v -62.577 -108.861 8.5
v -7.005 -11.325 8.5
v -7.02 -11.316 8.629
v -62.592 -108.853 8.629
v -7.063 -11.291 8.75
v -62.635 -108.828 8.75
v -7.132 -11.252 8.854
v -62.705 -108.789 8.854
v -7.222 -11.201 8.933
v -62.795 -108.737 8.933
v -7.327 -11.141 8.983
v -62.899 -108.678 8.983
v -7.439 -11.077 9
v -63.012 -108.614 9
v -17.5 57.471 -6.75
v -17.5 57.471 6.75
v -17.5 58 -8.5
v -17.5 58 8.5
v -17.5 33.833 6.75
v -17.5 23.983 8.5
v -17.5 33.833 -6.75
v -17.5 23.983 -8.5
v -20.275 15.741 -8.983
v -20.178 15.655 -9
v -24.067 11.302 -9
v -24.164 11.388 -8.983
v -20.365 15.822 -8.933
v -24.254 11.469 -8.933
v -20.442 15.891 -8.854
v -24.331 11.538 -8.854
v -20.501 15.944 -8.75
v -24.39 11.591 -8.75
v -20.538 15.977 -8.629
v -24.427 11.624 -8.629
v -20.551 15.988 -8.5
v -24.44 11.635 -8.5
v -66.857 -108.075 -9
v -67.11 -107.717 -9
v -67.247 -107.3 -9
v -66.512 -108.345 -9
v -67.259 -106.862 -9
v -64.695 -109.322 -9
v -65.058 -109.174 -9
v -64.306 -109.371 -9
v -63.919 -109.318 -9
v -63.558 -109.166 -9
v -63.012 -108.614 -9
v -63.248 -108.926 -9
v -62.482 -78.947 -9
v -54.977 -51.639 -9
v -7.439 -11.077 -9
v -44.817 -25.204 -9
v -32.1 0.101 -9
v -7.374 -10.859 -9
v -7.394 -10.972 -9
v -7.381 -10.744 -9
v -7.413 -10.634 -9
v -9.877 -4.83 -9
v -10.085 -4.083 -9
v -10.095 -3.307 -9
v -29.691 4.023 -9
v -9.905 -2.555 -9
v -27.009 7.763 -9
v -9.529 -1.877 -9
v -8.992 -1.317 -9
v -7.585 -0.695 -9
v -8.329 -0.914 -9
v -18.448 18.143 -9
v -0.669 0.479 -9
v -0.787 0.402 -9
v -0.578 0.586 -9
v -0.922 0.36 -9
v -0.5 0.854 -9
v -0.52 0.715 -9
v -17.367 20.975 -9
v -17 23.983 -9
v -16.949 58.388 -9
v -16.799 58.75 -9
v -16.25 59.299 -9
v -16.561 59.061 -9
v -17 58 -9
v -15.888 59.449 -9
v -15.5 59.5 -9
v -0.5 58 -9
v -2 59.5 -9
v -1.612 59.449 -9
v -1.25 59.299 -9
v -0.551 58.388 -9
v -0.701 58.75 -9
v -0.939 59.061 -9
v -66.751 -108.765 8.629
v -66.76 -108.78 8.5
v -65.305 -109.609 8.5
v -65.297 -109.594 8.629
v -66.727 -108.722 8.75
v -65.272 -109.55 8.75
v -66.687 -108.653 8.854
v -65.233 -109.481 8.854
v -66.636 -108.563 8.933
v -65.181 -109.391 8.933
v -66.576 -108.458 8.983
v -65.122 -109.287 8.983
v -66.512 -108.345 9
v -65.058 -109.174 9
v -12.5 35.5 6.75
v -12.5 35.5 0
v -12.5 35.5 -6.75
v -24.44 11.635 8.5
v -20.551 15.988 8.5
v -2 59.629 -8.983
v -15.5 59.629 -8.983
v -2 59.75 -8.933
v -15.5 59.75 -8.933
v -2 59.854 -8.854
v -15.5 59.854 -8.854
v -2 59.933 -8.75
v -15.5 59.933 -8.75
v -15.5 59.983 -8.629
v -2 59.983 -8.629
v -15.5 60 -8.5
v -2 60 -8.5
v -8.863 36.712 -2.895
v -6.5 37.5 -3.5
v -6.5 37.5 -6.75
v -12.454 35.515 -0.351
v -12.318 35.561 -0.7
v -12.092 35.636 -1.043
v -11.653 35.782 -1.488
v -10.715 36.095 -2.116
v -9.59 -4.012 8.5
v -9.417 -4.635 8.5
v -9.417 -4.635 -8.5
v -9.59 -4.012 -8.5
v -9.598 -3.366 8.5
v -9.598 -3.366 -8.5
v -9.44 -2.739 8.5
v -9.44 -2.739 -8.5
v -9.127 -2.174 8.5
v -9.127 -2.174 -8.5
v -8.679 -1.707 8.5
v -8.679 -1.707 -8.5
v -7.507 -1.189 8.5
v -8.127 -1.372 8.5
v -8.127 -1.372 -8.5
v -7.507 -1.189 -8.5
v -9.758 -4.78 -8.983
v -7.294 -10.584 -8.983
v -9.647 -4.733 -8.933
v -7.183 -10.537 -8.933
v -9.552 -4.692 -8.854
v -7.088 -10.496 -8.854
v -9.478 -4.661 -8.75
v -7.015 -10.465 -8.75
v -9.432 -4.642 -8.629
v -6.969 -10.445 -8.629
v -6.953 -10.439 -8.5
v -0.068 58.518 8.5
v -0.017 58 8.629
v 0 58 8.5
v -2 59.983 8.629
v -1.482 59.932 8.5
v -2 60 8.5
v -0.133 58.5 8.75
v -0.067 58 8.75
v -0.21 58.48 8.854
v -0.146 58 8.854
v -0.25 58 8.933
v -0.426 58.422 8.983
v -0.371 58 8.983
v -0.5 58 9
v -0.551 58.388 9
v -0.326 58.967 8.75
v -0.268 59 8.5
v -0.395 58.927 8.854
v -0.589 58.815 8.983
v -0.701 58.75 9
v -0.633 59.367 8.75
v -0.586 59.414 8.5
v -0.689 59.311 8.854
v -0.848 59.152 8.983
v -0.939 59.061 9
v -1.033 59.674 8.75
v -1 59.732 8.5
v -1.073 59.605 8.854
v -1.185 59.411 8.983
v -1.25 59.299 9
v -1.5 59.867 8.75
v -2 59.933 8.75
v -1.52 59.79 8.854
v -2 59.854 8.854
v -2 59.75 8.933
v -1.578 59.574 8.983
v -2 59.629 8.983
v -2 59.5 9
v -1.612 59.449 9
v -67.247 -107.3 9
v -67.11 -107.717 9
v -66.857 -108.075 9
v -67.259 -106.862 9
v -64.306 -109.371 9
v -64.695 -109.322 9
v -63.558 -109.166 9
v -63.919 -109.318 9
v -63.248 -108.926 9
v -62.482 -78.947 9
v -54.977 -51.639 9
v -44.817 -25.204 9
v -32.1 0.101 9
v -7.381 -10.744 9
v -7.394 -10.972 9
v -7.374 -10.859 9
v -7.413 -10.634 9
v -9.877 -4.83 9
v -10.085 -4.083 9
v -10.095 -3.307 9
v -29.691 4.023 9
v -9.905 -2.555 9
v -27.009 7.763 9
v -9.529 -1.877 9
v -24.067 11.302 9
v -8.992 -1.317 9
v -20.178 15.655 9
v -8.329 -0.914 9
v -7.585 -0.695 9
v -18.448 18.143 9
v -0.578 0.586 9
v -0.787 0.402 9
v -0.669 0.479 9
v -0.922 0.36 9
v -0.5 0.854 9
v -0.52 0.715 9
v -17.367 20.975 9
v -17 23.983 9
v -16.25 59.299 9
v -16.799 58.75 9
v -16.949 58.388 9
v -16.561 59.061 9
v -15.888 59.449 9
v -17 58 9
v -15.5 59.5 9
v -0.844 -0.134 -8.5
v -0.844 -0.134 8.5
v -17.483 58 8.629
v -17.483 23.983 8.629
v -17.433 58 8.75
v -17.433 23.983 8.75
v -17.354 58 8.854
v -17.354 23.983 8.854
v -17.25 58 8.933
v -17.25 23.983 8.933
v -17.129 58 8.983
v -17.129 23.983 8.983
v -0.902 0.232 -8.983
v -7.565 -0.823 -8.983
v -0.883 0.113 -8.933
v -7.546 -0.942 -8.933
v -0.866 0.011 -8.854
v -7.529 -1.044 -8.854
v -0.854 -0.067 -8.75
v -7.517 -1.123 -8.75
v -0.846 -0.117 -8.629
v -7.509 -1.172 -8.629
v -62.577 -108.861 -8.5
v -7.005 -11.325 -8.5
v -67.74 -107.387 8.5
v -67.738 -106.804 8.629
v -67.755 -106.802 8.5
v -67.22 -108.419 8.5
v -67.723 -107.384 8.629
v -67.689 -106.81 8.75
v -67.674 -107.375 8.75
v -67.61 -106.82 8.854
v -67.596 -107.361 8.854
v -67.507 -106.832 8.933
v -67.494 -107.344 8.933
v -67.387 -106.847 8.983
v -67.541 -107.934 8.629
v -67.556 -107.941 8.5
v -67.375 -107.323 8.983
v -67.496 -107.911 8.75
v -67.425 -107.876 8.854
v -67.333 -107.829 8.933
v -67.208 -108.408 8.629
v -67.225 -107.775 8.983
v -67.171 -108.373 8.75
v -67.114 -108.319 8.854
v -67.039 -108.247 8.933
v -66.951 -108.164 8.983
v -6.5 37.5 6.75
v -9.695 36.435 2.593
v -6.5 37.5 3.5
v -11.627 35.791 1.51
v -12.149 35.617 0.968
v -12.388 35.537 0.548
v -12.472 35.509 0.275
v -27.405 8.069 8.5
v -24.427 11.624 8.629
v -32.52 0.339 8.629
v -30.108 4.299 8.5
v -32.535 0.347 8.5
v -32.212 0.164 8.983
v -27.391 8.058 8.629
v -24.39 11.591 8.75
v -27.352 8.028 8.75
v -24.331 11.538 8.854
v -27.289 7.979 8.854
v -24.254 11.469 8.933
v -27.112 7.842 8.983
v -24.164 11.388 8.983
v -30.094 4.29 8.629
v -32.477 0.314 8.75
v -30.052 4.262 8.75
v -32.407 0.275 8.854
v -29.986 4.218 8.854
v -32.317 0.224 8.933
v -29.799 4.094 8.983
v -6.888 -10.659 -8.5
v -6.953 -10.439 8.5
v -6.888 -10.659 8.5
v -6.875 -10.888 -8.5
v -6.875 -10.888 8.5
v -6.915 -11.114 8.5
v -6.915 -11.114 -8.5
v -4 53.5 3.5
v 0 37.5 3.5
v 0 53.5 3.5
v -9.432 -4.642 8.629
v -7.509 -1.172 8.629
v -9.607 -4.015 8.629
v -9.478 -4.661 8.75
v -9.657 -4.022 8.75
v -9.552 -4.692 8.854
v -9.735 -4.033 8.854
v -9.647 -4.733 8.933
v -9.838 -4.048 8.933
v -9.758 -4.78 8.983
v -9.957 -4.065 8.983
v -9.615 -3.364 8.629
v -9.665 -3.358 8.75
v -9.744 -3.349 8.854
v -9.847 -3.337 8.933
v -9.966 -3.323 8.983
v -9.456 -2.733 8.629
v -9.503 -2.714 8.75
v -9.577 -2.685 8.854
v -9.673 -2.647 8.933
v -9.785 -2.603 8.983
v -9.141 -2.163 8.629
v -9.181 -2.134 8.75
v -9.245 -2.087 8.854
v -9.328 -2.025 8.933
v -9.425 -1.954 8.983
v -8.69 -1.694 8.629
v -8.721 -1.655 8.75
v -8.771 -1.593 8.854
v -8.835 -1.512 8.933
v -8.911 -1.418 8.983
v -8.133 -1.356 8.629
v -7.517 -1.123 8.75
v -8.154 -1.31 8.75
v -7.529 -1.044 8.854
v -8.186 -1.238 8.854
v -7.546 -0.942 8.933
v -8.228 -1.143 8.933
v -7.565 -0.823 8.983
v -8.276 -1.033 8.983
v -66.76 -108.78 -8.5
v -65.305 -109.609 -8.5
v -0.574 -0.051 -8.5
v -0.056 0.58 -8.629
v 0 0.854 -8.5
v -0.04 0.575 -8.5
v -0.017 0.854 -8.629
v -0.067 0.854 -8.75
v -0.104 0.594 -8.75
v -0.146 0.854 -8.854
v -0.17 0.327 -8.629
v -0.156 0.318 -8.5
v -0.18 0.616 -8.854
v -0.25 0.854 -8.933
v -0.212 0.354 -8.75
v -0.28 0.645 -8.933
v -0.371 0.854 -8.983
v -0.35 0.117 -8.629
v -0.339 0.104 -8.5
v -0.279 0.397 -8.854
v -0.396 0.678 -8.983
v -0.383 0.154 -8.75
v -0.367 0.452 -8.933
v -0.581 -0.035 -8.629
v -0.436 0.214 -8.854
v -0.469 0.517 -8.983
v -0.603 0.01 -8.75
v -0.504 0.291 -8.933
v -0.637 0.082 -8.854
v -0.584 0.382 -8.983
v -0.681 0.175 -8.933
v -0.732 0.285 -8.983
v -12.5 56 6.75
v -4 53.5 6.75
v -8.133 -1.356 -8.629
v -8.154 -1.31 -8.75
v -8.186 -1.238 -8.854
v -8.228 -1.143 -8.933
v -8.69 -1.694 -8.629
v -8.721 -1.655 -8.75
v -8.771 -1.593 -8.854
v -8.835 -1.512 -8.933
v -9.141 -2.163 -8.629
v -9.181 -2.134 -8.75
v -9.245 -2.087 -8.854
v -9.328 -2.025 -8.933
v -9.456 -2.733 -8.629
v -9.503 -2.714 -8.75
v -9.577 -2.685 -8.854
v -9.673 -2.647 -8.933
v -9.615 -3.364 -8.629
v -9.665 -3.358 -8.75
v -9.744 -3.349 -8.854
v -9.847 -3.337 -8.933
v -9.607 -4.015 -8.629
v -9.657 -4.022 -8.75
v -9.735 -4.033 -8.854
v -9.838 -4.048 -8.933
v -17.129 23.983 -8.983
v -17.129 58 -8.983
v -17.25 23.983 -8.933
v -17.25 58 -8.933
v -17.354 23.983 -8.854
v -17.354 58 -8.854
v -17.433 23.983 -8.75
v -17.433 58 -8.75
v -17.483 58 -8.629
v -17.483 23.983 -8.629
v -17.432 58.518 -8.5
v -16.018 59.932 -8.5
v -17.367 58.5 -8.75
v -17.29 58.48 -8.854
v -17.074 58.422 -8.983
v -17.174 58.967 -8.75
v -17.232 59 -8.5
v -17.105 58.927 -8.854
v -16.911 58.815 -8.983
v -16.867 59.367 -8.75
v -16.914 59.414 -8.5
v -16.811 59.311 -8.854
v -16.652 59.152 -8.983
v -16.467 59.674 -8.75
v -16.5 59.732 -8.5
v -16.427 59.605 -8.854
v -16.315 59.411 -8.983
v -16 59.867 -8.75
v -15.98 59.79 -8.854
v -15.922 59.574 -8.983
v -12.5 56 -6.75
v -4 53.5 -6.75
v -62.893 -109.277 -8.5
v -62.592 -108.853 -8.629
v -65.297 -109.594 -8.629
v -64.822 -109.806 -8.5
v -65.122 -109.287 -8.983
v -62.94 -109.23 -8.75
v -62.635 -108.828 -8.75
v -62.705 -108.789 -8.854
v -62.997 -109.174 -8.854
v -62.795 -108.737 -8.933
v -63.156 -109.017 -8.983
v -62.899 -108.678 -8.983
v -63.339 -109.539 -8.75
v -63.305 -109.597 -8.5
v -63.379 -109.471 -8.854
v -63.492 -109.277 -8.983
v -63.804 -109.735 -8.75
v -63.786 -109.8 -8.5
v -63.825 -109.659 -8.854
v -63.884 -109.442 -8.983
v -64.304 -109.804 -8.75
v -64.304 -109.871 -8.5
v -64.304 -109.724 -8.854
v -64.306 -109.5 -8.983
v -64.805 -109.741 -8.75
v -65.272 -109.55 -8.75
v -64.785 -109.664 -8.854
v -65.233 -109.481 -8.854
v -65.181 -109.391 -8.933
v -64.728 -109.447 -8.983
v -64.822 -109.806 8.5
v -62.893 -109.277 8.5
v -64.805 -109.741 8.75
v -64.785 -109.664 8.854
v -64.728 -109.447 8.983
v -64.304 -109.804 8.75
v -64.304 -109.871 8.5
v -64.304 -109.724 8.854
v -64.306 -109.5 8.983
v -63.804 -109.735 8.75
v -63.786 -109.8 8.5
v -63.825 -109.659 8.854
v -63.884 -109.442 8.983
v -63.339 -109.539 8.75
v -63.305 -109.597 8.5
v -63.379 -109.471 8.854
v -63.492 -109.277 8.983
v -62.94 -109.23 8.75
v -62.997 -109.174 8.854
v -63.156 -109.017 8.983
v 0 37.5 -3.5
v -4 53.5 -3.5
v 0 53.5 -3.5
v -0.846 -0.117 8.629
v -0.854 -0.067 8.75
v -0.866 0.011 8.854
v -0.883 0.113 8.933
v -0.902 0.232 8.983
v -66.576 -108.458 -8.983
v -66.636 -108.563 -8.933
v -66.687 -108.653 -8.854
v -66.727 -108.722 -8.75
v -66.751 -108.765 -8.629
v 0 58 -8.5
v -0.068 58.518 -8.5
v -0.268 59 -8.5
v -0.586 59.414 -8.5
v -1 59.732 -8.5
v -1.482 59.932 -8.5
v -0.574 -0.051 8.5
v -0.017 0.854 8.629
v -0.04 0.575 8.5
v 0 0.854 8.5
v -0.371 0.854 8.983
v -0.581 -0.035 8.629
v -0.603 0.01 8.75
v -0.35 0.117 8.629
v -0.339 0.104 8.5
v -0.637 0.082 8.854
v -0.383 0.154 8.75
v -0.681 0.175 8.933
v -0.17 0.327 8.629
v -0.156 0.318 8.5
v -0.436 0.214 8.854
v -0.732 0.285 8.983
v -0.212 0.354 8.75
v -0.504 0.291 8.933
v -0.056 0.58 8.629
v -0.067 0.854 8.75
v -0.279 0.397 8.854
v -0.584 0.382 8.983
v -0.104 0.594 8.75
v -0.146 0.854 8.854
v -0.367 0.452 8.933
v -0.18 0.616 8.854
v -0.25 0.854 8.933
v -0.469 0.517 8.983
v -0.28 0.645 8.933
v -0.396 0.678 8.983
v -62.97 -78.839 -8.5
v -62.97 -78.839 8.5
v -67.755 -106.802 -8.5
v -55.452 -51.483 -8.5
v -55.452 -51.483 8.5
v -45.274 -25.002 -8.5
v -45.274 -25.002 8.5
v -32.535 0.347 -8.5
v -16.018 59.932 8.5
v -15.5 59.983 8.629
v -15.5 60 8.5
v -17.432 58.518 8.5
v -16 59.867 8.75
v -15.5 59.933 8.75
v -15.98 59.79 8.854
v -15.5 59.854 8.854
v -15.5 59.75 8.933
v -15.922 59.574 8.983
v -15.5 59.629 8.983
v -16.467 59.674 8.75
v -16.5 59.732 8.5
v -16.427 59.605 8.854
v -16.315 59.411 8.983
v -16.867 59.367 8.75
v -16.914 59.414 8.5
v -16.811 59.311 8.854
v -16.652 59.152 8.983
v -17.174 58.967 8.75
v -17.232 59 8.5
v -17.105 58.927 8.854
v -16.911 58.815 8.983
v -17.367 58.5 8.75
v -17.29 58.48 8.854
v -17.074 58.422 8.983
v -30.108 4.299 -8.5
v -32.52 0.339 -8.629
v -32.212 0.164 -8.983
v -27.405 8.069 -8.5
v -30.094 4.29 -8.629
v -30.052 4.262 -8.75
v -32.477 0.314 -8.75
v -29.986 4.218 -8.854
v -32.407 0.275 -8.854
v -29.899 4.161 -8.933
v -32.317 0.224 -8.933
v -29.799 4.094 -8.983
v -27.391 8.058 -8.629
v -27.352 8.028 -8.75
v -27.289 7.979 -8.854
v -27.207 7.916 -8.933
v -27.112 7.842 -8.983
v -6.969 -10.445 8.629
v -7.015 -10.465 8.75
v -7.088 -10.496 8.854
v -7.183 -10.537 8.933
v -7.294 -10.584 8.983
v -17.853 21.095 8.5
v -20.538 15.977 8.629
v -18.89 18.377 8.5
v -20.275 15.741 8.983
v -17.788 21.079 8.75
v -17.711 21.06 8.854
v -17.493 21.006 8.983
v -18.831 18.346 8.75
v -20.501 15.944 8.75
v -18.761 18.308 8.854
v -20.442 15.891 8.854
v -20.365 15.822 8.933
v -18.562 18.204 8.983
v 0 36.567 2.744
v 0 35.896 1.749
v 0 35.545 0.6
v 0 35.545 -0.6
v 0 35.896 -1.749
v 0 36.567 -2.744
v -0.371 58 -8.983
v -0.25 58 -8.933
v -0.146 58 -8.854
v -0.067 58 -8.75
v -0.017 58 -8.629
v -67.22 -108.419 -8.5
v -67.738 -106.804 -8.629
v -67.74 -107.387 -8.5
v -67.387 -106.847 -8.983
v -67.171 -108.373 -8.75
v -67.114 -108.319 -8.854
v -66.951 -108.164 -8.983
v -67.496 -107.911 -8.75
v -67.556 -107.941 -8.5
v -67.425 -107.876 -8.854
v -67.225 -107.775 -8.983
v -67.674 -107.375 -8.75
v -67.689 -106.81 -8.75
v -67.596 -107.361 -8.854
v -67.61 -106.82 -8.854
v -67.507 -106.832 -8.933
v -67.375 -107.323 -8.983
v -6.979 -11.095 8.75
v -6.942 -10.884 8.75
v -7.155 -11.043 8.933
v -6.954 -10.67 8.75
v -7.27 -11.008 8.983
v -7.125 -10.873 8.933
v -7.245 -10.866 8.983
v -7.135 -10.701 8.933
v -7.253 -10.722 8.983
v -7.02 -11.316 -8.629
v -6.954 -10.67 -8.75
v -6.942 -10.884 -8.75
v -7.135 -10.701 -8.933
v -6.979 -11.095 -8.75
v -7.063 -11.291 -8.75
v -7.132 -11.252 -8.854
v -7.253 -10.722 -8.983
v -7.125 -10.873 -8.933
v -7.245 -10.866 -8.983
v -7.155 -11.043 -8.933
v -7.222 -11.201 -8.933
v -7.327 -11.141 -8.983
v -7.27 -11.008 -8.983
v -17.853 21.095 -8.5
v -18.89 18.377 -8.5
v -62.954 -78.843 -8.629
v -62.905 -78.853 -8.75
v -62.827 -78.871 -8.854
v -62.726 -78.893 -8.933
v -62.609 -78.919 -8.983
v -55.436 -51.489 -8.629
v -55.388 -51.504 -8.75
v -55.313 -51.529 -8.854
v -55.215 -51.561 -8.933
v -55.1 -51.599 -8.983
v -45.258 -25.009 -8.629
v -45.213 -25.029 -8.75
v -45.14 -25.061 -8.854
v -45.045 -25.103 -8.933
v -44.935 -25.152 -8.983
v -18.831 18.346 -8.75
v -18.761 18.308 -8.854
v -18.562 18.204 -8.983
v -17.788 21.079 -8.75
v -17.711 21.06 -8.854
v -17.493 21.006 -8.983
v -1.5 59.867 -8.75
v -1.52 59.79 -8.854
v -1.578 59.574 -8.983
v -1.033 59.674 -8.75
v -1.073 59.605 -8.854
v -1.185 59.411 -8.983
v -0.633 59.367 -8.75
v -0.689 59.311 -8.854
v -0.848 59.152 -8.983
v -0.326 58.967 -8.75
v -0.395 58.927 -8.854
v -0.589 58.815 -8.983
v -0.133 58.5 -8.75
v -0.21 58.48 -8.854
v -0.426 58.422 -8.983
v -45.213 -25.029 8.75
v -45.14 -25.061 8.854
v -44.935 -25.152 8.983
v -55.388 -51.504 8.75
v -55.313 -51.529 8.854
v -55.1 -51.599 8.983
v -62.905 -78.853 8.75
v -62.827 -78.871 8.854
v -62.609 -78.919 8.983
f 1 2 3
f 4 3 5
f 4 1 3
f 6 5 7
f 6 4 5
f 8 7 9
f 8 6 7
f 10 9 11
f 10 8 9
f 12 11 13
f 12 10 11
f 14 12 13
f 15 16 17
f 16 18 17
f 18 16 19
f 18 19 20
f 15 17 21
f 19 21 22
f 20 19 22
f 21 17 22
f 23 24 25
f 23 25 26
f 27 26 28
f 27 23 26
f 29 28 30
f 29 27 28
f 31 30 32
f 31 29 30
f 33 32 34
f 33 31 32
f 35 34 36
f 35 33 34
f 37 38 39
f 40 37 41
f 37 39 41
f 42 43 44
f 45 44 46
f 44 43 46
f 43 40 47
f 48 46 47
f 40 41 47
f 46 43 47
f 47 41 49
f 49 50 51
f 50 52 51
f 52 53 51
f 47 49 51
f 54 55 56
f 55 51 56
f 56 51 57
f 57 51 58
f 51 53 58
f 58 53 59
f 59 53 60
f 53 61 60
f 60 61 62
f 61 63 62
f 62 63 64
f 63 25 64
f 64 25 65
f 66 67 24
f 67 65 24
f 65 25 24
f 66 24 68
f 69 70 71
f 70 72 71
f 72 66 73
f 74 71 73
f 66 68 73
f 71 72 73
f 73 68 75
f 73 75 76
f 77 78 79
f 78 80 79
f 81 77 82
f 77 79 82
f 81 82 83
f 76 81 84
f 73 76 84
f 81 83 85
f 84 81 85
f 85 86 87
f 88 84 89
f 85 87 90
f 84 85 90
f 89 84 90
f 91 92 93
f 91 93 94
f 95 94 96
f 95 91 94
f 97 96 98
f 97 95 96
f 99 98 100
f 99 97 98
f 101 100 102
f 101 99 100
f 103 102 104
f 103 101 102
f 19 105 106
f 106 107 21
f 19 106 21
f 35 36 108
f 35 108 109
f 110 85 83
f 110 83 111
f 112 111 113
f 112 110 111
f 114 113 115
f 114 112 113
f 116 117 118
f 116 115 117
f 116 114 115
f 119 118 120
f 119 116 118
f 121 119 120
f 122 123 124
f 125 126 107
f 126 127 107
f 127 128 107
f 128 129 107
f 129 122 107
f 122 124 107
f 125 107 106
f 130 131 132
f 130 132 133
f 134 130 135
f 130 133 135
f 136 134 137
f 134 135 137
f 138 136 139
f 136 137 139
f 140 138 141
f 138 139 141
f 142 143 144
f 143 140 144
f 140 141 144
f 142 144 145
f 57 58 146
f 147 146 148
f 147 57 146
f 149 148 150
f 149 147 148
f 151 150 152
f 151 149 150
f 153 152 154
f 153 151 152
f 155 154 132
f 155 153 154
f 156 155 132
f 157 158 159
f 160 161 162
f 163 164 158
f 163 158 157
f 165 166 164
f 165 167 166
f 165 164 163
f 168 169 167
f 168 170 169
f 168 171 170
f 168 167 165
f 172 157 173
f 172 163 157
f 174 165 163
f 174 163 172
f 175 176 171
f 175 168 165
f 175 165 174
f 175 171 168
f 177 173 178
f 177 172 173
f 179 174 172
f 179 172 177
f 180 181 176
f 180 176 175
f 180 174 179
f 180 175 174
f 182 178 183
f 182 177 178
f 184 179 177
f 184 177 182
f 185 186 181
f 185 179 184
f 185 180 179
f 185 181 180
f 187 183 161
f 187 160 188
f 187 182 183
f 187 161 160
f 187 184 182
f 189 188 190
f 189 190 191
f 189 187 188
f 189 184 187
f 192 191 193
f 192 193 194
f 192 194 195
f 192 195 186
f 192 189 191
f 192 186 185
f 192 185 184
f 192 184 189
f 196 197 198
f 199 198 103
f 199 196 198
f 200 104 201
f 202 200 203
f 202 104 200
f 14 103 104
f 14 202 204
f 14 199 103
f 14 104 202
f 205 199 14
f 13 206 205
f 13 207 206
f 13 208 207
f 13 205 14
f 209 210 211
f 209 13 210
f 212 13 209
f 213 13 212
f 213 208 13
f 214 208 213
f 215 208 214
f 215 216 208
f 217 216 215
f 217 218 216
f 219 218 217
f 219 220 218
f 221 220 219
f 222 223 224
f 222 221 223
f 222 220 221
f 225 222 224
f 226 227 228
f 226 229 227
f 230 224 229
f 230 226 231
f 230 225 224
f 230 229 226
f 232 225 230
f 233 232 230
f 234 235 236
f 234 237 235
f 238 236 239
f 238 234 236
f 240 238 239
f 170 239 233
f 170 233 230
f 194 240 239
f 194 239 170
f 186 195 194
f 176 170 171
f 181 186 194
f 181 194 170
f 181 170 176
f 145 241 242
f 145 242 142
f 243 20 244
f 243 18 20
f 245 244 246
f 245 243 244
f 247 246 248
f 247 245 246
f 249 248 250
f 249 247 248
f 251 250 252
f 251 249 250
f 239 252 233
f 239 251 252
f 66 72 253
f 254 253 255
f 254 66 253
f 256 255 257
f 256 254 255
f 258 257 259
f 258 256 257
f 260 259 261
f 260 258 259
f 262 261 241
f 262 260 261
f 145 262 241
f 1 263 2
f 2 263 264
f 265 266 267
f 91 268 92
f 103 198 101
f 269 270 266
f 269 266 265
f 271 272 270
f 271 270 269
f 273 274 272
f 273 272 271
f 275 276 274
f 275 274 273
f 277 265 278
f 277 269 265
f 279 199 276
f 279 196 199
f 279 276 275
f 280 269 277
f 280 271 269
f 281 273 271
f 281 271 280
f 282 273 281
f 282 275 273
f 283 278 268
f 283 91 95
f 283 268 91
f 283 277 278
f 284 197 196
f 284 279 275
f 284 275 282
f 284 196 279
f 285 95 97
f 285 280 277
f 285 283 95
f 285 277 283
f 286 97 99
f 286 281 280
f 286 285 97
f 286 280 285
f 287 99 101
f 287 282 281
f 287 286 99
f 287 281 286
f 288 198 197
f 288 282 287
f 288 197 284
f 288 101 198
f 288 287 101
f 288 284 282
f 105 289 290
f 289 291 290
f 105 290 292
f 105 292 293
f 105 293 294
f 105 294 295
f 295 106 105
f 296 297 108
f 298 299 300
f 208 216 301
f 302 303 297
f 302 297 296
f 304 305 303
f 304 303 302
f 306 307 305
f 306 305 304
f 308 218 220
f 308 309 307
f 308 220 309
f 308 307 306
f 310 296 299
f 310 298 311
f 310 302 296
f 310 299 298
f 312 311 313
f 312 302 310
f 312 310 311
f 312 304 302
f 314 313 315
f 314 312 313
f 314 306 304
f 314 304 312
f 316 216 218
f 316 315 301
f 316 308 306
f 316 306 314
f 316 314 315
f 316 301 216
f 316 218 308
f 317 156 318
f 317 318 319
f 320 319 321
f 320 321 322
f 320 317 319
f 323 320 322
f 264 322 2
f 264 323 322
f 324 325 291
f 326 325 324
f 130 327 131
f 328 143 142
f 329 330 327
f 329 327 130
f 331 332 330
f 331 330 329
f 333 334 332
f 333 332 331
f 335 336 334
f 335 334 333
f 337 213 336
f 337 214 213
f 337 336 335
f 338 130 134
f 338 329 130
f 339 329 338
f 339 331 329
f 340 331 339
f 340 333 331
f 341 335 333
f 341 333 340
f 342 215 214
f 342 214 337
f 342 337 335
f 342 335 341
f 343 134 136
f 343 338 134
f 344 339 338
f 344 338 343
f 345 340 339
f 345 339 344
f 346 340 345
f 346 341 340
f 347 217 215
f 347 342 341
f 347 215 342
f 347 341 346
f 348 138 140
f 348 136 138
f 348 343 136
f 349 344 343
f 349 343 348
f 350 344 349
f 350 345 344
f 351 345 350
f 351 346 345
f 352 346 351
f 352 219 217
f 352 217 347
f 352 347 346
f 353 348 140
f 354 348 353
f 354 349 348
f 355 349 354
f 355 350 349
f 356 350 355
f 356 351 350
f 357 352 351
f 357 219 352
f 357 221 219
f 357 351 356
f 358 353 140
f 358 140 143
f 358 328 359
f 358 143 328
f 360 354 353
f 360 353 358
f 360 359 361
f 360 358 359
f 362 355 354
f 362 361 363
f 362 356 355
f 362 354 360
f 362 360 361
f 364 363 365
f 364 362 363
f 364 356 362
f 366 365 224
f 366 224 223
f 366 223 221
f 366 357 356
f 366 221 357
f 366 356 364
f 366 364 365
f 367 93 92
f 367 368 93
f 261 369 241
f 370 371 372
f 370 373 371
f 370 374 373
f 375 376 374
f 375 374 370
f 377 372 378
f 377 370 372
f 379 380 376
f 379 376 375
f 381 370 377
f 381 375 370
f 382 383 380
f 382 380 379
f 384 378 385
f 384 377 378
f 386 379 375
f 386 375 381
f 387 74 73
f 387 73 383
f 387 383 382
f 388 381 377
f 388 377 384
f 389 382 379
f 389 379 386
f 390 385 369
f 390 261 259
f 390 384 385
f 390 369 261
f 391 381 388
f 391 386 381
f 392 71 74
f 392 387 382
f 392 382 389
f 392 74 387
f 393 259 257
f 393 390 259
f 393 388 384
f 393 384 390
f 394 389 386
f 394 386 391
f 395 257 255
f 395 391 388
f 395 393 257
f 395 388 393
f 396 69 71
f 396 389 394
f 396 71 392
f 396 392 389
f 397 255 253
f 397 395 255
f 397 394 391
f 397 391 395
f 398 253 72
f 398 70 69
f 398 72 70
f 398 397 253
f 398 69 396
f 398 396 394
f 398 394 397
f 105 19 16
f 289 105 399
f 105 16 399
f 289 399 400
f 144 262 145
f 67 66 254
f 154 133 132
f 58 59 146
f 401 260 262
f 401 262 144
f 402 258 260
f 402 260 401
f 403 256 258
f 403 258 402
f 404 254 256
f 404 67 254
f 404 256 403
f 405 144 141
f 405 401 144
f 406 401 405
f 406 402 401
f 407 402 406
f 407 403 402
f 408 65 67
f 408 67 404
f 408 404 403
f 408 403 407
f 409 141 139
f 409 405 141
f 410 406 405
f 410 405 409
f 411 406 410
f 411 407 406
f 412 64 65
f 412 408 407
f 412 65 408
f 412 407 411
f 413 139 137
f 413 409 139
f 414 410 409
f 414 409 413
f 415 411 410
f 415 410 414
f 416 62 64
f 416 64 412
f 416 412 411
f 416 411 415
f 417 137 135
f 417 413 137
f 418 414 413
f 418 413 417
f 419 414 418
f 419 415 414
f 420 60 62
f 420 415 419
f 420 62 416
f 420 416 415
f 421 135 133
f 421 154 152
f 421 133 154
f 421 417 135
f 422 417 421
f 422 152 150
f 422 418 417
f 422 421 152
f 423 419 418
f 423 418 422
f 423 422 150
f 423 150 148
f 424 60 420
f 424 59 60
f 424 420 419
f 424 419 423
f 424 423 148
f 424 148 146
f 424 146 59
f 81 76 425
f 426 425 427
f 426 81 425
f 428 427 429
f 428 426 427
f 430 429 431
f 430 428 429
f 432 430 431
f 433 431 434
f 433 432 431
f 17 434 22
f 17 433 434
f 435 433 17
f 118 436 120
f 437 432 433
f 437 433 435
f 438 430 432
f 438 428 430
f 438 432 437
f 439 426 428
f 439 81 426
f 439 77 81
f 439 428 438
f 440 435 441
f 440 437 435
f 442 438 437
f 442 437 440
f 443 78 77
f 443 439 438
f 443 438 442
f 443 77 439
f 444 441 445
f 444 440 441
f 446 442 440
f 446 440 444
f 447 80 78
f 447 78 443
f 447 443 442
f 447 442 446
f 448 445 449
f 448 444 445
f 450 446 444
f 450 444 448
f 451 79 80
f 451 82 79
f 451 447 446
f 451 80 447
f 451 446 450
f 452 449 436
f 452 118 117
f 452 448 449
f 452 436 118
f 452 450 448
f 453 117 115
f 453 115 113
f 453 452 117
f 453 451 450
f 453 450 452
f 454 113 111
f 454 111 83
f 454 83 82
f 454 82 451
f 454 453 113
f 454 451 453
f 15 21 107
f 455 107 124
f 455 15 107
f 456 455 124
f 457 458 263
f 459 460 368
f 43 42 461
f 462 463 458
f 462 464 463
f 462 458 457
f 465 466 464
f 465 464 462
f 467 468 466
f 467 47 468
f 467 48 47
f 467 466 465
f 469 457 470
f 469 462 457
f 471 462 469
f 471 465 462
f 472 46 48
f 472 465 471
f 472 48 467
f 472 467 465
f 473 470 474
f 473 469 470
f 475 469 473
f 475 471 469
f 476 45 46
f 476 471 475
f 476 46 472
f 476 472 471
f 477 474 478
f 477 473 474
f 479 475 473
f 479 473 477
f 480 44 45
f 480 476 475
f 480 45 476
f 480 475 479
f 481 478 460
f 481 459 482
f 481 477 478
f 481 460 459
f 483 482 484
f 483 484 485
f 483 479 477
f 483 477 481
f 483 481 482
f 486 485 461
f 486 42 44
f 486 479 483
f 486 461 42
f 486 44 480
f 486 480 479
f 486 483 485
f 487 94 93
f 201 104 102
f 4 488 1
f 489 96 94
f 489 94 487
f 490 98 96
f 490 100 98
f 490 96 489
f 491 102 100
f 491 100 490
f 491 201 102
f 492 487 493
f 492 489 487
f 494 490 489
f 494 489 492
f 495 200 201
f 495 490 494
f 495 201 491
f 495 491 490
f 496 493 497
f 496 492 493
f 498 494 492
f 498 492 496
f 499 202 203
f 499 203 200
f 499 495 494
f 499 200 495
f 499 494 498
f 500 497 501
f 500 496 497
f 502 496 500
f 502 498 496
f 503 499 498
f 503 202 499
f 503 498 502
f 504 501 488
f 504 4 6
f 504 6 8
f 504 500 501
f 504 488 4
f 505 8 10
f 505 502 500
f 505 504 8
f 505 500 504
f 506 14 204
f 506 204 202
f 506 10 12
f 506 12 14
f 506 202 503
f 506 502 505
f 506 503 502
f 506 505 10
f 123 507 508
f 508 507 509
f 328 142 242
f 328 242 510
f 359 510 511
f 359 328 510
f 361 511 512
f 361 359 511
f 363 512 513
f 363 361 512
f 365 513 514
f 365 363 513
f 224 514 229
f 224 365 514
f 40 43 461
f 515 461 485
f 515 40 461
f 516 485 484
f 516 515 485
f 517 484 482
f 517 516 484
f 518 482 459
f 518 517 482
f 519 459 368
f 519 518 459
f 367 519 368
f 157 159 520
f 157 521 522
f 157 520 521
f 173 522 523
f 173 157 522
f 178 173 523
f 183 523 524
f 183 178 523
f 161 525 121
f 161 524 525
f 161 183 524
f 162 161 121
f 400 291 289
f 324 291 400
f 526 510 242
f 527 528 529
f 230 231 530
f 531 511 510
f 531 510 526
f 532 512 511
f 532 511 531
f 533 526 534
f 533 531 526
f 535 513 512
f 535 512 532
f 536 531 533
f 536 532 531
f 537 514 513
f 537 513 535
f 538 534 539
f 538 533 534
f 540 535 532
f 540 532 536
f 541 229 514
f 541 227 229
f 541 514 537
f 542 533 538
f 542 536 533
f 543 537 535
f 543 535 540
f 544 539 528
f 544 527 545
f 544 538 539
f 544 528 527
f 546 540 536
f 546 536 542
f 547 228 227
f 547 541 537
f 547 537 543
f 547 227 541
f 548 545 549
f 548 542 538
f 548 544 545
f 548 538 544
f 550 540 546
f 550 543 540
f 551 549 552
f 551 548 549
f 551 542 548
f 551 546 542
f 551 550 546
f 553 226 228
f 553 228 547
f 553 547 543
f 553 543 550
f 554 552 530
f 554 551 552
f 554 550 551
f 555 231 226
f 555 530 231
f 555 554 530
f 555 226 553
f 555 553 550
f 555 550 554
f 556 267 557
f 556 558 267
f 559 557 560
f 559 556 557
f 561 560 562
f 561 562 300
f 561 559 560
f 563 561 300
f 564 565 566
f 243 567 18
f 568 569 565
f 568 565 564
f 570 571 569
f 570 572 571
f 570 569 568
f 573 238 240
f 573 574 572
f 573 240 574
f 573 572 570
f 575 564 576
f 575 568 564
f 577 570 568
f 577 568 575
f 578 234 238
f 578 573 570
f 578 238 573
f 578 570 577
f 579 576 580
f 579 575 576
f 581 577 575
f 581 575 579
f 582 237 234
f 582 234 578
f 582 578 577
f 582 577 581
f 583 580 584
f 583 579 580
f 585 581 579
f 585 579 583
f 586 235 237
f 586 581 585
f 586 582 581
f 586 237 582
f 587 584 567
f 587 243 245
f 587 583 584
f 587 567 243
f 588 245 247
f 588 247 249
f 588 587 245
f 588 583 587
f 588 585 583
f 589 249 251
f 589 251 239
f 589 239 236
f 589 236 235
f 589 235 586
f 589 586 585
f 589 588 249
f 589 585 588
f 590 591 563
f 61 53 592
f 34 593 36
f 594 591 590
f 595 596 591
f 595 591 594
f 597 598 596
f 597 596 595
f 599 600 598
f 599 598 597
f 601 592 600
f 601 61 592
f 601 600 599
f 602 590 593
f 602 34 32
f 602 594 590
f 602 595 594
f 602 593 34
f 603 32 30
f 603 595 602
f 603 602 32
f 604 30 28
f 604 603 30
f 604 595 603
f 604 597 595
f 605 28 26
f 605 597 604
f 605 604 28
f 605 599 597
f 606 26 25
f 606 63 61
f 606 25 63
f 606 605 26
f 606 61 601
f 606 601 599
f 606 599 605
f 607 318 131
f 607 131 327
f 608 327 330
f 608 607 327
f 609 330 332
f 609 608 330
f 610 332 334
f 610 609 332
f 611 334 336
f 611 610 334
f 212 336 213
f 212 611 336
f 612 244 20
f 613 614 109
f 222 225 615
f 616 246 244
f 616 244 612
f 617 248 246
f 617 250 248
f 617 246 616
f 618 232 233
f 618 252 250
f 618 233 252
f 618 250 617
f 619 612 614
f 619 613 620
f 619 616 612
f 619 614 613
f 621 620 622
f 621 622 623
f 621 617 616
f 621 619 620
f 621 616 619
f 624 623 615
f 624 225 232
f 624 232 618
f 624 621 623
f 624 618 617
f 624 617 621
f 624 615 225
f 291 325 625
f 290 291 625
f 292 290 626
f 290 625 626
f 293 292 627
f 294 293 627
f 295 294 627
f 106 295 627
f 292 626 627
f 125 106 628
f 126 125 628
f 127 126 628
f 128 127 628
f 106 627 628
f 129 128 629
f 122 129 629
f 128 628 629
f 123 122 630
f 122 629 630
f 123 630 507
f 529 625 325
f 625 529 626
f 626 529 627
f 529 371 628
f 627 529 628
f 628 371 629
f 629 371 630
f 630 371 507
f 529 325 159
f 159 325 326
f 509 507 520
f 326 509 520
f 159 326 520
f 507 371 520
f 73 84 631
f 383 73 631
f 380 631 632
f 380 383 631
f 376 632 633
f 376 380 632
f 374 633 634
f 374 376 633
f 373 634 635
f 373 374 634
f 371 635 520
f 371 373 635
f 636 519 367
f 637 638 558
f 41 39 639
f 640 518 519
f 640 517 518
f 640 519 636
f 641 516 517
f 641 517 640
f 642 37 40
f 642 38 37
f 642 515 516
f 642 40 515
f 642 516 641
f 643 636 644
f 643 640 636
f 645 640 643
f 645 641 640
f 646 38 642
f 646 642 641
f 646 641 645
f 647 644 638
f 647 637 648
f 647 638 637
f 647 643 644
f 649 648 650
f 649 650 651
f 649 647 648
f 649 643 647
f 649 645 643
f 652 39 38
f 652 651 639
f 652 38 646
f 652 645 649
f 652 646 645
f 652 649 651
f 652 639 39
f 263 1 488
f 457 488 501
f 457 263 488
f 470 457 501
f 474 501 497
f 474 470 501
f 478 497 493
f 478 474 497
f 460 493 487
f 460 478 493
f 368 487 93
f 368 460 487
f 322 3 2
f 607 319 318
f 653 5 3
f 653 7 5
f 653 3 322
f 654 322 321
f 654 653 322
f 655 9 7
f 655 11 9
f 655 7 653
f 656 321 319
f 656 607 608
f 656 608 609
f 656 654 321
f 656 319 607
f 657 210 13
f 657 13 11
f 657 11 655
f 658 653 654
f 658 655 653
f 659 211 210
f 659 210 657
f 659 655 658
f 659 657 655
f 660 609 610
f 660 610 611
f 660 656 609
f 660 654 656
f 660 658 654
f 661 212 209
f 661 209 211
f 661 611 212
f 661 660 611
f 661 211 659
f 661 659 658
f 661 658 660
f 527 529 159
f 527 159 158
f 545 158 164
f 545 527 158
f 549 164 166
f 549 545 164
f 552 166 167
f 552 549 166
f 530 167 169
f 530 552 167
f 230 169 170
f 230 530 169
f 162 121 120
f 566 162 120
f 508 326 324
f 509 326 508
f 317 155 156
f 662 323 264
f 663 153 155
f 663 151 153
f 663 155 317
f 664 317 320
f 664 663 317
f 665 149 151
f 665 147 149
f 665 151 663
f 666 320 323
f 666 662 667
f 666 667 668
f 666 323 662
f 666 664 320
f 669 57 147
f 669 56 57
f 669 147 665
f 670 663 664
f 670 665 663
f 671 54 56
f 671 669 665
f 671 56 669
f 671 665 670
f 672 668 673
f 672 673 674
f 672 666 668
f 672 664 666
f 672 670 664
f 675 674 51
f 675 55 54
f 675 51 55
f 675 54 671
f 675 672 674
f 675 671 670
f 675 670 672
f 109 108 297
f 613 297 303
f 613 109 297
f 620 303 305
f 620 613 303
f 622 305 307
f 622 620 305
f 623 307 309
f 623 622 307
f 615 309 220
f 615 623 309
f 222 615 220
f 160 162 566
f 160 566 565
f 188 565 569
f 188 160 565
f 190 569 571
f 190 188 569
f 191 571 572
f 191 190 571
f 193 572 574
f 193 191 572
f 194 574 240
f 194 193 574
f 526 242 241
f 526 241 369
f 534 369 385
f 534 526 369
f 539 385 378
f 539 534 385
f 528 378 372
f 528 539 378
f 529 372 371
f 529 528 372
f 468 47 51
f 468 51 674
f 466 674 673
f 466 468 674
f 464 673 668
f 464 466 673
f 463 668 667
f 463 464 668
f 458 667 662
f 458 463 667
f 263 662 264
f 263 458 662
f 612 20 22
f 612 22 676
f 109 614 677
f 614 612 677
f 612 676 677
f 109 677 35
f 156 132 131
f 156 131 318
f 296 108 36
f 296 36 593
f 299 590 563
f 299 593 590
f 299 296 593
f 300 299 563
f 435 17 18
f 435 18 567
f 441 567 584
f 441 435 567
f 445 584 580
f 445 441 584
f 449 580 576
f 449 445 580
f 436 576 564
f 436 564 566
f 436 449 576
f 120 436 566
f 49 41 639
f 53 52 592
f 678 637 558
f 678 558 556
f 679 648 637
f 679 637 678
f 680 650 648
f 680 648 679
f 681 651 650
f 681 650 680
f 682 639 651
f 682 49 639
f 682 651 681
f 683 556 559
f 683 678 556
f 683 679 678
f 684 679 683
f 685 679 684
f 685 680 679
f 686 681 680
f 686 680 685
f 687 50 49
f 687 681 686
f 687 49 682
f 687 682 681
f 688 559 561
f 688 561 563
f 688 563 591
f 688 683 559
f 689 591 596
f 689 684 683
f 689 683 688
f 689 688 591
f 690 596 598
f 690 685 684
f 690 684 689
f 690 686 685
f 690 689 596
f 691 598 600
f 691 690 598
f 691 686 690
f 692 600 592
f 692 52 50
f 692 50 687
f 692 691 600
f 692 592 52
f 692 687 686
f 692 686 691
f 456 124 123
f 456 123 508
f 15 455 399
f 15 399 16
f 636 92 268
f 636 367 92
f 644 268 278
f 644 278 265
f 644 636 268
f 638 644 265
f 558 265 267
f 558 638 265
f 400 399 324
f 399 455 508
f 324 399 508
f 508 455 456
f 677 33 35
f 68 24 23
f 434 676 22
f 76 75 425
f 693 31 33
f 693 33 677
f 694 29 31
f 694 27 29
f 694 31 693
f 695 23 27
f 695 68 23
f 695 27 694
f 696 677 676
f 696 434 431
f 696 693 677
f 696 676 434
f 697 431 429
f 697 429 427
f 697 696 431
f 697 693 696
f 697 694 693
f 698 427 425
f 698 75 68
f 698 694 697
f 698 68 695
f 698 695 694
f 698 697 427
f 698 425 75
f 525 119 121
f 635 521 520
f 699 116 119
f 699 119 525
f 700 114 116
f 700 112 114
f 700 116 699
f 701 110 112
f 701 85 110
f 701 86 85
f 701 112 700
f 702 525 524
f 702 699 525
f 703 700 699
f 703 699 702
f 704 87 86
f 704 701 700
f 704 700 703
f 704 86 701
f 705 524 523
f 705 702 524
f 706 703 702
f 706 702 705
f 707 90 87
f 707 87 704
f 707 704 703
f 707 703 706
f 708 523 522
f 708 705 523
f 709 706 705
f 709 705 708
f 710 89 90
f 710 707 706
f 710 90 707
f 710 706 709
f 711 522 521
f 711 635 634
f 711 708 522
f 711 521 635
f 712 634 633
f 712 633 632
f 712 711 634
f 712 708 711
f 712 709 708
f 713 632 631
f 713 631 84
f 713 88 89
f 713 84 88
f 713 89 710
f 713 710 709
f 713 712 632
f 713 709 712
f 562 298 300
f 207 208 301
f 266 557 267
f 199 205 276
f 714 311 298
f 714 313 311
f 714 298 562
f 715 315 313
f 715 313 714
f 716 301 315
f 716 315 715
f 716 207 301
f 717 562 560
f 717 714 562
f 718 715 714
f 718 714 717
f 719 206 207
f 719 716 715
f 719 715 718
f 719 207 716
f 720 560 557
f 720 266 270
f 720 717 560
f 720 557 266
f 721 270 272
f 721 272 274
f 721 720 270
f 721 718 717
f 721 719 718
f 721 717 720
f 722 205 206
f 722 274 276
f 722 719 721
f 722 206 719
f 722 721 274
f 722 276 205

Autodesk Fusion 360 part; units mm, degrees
sketch "Sketch1" plane through (0, 0, 0) normal (1, 0, 0) x (0, 1, 0) in component "MitiVac Handle"
  line L0 (0, 0) -> (0, 3.5)
  line L1 (0, 3.5) -> (53.5, 3.5)
  line L2 (53.5, 3.5) -> (53.5, 0)
  line L3 (53.5, 0) -> (37.5, 0)
  line L4 (37.5, 0) -> (35.5, 0)
  line L5 (37.5, 0) -> (37.5, 3.5)
  line L6 (0, 0) -> (0, -3.5)
  line L7 (0, -3.5) -> (53.5, -3.5)
  line L8 (53.5, -3.5) -> (53.5, 0)
  line L9 (37.5, 0) -> (37.5, -3.5)
  arc A0 (37.5, 3.5) -> (37.5, -3.5) centre (39.5625, 0) ccw
  line L10 (0, 0) -> (53.5, 0)
  line L11 (0, 0) -> (53.5, 0)
  line L12 (0, 3.5) -> (0, 9)
  line L13 (0, -3.5) -> (0, -9)
  line L14 (0, 9) -> (30, 9)
  line L15 (30, 9) -> (30, 12.5)
  line L16 (30, 12.5) -> (60, 12.5)
  line L17 (60, 12.5) -> (60, 0)
  line L18 (0, -9) -> (30, -9)
  line L19 (30, -9) -> (30, -12.5)
  line L20 (30, -12.5) -> (60, -12.5)
  line L21 (60, -12.5) -> (60, 0)
  dimension "d1" = 3.5
  dimension "d2" = 53.5
  dimension "d3" = 3.5
  dimension "d4" = 16
  dimension "d5" = 2
  dimension "d6" = 3.5
  dimension "d7" = 53.5
  dimension "d8" = 5.5
  dimension "d9" = 5.5
  dimension "d10" = 30
  dimension "d11" = 3.5
  dimension "d12" = 30
  dimension "d13" = 12.5
  dimension "d14" = 30
  dimension "d15" = 3.5
  dimension "d16" = 30
sketch "Sketch2" plane through (0, 0, 0) normal (0, 0, 1) x (1, 0, 0) in component "MitiVac Handle"
  line L0 (0, 0) -> (0, 53.5)
  line L1 (0, 0) -> (-10.667, -1.6895)
  line L2 (0, 0) -> (9, 0) construction
  line L3 (-10.667, -1.6895) -> (-6.7597, -10.8945)
  line L4 (-10.667, -1.6895) -> (-0.667, -1.6895) construction
  line L5 (0, 0) -> (-6.7597, -10.8945)
  line L6 (-6.7597, -10.8945) -> (18.2403, -10.8945) construction
  line L7 (0, 0) -> (0, -40)
  line L8 (0, -40) -> (-63.5674, -110.5988)
  line L9 (0, -40) -> (95, -40) construction
  line L10 (-63.5674, -110.5988) -> (-6.7597, -10.8945)
  line L11 (0, 53.5) -> (0, 60)
  line L12 (0, 60) -> (-12.5, 60)
  line L13 (-12.5, 60) -> (-12.5, 25)
  line L14 (-63.5674, -110.5988) -> (-67.9117, -108.1235)
  line L15 (-10.667, -1.6895) -> (-28.7932, 6.7629)
  line L16 (-10.667, -1.6895) -> (9.333, -1.6895) construction
  line L17 (-28.7932, 6.7629) -> (-12.5, 25)
  line L18 (-28.7932, 6.7629) -> (-54.1503, -47.6156)
  arc A0 (-28.7932, 6.7629) -> (-67.9117, -108.1235) centre (217.624, -141.2447) ccw
  line L19 (0, 53.5) -> (-4, 53.5)
  line L20 (0, 53.5) -> (0, 37.5)
  line L21 (0, 37.5) -> (0, 35.5)
  line L22 (0, 37.5) -> (-6.5, 37.5)
  line L23 (-6.5, 37.5) -> (-4, 53.5)
  line L24 (-12.5, 60) -> (-12.5, 56)
  line L25 (-12.5, 56) -> (-4, 53.5)
  line L26 (-6.5, 37.5) -> (-12.5, 37.5)
  line L27 (-12.5, 37.5) -> (-12.5, 35.5)
  line L28 (-6.5, 37.5) -> (-12.5, 35.5)
  line L29 (-12.5, 60) -> (-17.5, 60)
  line L30 (-17.5, 60) -> (-17.5, 19.4035)
  line L31 (-12.5, 35.5) -> (-17.5, 33.8333)
  line L32 (-12.5, 56) -> (-17.5, 57.4706)
  dimension "d17" = 53.5
  dimension "d18" = 10.8
  dimension "d19" = 171
  dimension "d20" = 67
  dimension "d21" = 10
  dimension "d24" = 40
  dimension "d25" = 132
  dimension "d26" = 95
  dimension "d27" = 6.5
  dimension "d28" = 12.5
  dimension "d29" = 35
  dimension "d30" = 5
  dimension "d31" = 155
  dimension "d32" = 20
  dimension "d33" = 60
  dimension "d34" = 4
  dimension "d35" = 16
  dimension "d36" = 2
  dimension "d37" = 6.5
  dimension "d38" = 4
  dimension "d39" = 2
  dimension "d66" = 5
extrude "Extrude1" add sketch "Sketch2" along normal mid plane 18 contours L0 L1 L13 L15 L17 L21 L22 L28 | L3 L10 L14 L15 L18 A0 | L0 L19 L20 L22 L23 | L18 A0 | L11 L12 L13 L19 L24 L25 | L13 L23 L25 L26 | L13 L26 L27 L28 | L13 L17 L30 L31 | L13 L27 L30 L31 L32 | L13 L24 L29 L30 L32 in component "MitiVac Handle"
extrude "Extrude3" cut sketch "Sketch1" against normal up to surface (17.5 mm away) contours L4 L5 A0 L10 L11 | L4 L9 A0 L10 L11 | L1 L2 L3 L5 L10 L11 | L3 L7 L8 L9 L10 L11 in component "MitiVac Handle"
extrude "Extrude4" cut sketch "Sketch2" along normal mid plane 13.5 contours L13 L23 L25 L26 | L13 L26 L27 L28 | L13 L27 L30 L31 L32 in component "MitiVac Handle"
fillet "Fillet2" radius 2.5 1 edges at (-10.667, -1.6895, 0) in component "MitiVac Handle"
fillet "Fillet2" radius 1 2 edges at (0, 0, 0) (-6.7597, -10.8945, 0) in component "MitiVac Handle"
fillet "Fillet2" radius 2 2 edges at (0, 60, 0) (-17.5, 60, 0) in component "MitiVac Handle"
fillet "Fillet2" radius 12 1 edges at (-17.5, 19.4035, 0) in component "MitiVac Handle"
fillet "Fillet2" radius 65 1 edges at (-28.7932, 6.7629, 0) in component "MitiVac Handle"
fillet "Fillet2" radius 2 2 edges at (-67.9117, -108.1235, 0) (-63.5674, -110.5988, 0) in component "MitiVac Handle"
fillet "Fillet3" radius 0.5 2 faces at (-29.4988, -14.8978, 9) (-29.4988, -14.8978, -9) in component "MitiVac Handle"
component "MitiVac Handle" placed x (1, 0, 0) y (0, 1, 0) z (0, 0, 1) at (0, 0, 0)
equation "d3 = d1"
equation "d6 = d1"
equation "d7 = d2"
equation "d8 = ( 18 / 2 ) * 1 mm - 3.5 mm"
equation "d9 = d8"
equation "d11 = ( 25 / 2 ) * 1 mm - d8 - d1"
equation "d12 = 60 mm - d10"
equation "d13 = d11 + d8 + d1"
equation "d14 = d10"
equation "d15 = d11"
equation "d16 = d12"
equation "d19 = 180 deg - 9 deg"
equation "d25 = 270 deg - 138 deg"
equation "d46 = ( 13.5 / 2 ) * 1 mm"
